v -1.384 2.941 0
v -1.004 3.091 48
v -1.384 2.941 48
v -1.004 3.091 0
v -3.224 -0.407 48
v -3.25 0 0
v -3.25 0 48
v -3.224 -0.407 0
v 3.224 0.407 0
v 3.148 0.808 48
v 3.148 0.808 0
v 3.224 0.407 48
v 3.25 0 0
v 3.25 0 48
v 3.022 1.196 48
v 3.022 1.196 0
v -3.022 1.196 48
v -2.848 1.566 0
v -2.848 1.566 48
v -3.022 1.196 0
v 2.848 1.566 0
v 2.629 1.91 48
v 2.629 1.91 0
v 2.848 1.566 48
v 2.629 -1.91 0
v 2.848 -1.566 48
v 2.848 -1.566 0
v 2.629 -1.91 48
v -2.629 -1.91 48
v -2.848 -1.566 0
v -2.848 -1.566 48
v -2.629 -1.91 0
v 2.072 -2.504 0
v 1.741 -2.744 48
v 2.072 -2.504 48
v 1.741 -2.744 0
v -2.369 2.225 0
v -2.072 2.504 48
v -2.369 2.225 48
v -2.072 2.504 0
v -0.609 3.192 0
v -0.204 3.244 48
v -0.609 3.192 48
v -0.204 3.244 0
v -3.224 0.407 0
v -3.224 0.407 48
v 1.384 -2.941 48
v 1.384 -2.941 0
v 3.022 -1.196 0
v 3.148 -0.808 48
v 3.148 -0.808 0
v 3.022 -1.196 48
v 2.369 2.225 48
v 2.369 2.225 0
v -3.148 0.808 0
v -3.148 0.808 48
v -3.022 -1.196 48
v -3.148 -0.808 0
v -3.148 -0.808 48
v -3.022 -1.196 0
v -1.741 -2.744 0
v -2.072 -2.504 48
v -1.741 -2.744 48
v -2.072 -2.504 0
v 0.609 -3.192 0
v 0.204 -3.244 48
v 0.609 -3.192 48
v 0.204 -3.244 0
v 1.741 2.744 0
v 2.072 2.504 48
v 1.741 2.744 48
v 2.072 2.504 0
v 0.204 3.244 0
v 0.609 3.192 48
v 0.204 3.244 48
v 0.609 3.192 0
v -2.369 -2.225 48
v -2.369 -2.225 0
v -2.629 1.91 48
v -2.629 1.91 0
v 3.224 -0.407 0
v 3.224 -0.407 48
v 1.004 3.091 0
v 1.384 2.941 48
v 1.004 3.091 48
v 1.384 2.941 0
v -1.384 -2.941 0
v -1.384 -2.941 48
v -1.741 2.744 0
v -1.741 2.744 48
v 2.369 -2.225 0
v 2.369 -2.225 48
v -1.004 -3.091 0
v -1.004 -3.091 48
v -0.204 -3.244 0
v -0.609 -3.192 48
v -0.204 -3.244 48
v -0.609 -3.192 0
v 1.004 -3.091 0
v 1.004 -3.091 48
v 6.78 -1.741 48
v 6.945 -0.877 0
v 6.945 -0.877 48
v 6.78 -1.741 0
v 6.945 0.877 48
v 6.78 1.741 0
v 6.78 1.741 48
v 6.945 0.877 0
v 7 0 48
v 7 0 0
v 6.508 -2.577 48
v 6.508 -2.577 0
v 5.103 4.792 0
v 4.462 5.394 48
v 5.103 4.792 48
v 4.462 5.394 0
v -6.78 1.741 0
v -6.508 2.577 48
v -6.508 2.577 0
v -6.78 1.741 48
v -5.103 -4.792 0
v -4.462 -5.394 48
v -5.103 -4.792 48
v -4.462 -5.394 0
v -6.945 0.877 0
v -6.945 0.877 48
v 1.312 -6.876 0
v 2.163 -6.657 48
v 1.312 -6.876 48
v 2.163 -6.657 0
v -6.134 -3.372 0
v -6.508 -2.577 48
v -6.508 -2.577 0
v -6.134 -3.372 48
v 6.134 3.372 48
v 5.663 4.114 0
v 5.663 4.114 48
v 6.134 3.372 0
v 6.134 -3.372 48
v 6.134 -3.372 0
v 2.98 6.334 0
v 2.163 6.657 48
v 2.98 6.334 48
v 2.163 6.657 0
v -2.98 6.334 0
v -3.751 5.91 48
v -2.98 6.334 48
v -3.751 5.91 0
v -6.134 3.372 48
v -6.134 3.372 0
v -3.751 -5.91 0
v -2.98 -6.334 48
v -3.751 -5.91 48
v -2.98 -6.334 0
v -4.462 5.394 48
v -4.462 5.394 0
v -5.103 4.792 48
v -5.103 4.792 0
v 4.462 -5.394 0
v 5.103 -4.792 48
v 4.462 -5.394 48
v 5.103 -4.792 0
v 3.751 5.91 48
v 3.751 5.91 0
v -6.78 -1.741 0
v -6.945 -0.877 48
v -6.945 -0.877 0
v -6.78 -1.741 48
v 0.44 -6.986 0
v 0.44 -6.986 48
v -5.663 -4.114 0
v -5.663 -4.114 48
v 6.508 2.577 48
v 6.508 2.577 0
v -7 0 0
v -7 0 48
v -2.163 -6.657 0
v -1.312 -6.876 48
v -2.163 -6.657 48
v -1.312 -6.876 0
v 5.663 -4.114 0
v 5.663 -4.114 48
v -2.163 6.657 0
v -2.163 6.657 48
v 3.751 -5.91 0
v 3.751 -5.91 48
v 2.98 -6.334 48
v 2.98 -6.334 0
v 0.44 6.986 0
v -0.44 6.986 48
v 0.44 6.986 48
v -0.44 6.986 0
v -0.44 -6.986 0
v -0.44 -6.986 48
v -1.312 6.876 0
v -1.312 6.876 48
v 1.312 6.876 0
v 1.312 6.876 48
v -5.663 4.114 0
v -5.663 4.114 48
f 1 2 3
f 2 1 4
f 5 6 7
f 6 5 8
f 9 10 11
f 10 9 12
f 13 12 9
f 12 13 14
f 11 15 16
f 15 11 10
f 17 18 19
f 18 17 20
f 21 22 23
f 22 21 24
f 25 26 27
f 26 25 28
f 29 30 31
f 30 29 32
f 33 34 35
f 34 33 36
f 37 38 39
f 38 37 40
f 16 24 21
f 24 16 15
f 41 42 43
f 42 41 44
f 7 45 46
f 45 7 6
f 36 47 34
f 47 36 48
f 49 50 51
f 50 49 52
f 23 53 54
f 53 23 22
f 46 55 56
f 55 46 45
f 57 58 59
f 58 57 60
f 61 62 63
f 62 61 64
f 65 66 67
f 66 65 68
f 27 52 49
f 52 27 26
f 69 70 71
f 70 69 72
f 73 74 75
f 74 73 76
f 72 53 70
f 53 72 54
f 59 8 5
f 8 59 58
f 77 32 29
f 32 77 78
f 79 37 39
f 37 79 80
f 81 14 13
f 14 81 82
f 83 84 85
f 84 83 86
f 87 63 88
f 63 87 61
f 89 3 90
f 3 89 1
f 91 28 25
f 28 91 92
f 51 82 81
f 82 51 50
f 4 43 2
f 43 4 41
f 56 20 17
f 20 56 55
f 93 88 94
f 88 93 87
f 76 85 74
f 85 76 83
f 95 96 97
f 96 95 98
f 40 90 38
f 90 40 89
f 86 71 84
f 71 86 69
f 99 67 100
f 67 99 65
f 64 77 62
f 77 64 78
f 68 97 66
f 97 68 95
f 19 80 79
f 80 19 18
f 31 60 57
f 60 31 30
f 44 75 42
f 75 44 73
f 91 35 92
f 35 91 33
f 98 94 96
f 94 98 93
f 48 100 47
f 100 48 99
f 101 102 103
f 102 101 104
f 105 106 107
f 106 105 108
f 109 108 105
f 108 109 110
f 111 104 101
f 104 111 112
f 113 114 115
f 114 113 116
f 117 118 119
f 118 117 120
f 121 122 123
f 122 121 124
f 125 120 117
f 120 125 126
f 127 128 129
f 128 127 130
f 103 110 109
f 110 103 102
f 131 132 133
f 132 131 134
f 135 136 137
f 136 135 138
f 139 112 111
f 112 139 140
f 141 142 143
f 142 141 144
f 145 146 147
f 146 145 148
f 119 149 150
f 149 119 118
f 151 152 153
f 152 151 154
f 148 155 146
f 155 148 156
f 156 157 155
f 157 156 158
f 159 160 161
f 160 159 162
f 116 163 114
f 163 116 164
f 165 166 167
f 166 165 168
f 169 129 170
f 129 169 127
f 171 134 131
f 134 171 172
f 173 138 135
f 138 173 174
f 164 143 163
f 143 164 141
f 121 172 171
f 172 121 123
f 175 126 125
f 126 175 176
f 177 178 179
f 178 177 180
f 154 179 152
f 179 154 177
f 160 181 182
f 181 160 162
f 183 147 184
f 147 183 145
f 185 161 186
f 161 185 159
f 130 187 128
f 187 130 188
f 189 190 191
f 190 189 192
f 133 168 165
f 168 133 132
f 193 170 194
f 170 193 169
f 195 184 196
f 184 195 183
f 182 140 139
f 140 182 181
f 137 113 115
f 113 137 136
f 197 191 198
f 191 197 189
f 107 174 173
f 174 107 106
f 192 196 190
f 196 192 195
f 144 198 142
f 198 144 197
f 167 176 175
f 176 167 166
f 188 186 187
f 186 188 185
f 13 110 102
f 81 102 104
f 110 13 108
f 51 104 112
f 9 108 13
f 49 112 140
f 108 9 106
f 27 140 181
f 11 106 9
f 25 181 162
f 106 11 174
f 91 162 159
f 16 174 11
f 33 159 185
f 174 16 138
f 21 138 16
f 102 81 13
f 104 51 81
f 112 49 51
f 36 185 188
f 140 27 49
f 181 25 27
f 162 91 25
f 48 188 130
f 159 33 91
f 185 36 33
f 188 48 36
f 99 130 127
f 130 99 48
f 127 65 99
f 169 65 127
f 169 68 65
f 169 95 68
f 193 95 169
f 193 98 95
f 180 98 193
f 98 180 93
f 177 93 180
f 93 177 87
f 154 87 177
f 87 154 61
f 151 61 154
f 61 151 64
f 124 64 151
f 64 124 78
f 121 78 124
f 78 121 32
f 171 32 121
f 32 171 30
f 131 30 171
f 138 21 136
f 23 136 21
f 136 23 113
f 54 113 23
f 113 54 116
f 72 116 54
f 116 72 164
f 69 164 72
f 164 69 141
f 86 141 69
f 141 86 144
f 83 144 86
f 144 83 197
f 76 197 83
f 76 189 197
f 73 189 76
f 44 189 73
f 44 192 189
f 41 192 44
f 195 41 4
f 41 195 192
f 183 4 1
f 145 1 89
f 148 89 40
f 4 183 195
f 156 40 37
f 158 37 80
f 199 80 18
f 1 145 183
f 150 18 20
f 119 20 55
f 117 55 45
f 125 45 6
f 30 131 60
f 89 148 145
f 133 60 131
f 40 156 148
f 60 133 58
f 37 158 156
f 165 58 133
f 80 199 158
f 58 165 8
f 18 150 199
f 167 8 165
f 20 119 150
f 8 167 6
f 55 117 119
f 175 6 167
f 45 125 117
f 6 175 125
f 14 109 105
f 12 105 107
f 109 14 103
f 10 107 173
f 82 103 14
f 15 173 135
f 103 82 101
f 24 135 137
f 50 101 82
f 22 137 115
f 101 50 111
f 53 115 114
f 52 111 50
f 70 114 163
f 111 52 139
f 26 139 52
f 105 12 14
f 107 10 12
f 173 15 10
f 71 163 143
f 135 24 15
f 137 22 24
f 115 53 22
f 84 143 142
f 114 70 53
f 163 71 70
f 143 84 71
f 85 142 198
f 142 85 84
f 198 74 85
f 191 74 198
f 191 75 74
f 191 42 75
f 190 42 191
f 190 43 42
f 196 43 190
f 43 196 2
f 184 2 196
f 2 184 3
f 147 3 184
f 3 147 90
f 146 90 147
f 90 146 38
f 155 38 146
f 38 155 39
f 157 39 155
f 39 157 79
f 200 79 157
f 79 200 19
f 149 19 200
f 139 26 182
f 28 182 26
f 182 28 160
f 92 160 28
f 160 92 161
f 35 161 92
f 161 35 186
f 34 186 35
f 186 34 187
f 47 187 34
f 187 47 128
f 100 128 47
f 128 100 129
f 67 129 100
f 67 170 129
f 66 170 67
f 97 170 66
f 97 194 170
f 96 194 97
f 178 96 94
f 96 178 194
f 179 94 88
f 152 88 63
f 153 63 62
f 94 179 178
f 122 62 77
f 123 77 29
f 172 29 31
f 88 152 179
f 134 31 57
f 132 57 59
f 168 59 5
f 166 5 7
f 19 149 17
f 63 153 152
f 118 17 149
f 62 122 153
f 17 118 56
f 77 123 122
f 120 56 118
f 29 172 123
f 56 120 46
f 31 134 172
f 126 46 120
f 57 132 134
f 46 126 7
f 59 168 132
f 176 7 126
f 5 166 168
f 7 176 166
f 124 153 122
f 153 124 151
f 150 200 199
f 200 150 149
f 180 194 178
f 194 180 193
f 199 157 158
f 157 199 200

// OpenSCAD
$fn = 50;


difference() {
	union() {
		cylinder(h = 48, r = 7.0000000000);
	}
	union() {
		translate(v = [0.0000000000, 0.0000000000, -100.0000000000]) {
			cylinder(h = 200, r = 3.2500000000);
		}
		translate(v = [0.0000000000, 0.0000000000, -100.0000000000]) {
			cylinder(h = 200, r = 3.2500000000);
		}
		translate(v = [0.0000000000, 0.0000000000, -100.0000000000]) {
			cylinder(h = 200, r = 3.2500000000);
		}
		translate(v = [0.0000000000, 0.0000000000, -100.0000000000]) {
			cylinder(h = 200, r = 3.2500000000);
		}
	}
}
